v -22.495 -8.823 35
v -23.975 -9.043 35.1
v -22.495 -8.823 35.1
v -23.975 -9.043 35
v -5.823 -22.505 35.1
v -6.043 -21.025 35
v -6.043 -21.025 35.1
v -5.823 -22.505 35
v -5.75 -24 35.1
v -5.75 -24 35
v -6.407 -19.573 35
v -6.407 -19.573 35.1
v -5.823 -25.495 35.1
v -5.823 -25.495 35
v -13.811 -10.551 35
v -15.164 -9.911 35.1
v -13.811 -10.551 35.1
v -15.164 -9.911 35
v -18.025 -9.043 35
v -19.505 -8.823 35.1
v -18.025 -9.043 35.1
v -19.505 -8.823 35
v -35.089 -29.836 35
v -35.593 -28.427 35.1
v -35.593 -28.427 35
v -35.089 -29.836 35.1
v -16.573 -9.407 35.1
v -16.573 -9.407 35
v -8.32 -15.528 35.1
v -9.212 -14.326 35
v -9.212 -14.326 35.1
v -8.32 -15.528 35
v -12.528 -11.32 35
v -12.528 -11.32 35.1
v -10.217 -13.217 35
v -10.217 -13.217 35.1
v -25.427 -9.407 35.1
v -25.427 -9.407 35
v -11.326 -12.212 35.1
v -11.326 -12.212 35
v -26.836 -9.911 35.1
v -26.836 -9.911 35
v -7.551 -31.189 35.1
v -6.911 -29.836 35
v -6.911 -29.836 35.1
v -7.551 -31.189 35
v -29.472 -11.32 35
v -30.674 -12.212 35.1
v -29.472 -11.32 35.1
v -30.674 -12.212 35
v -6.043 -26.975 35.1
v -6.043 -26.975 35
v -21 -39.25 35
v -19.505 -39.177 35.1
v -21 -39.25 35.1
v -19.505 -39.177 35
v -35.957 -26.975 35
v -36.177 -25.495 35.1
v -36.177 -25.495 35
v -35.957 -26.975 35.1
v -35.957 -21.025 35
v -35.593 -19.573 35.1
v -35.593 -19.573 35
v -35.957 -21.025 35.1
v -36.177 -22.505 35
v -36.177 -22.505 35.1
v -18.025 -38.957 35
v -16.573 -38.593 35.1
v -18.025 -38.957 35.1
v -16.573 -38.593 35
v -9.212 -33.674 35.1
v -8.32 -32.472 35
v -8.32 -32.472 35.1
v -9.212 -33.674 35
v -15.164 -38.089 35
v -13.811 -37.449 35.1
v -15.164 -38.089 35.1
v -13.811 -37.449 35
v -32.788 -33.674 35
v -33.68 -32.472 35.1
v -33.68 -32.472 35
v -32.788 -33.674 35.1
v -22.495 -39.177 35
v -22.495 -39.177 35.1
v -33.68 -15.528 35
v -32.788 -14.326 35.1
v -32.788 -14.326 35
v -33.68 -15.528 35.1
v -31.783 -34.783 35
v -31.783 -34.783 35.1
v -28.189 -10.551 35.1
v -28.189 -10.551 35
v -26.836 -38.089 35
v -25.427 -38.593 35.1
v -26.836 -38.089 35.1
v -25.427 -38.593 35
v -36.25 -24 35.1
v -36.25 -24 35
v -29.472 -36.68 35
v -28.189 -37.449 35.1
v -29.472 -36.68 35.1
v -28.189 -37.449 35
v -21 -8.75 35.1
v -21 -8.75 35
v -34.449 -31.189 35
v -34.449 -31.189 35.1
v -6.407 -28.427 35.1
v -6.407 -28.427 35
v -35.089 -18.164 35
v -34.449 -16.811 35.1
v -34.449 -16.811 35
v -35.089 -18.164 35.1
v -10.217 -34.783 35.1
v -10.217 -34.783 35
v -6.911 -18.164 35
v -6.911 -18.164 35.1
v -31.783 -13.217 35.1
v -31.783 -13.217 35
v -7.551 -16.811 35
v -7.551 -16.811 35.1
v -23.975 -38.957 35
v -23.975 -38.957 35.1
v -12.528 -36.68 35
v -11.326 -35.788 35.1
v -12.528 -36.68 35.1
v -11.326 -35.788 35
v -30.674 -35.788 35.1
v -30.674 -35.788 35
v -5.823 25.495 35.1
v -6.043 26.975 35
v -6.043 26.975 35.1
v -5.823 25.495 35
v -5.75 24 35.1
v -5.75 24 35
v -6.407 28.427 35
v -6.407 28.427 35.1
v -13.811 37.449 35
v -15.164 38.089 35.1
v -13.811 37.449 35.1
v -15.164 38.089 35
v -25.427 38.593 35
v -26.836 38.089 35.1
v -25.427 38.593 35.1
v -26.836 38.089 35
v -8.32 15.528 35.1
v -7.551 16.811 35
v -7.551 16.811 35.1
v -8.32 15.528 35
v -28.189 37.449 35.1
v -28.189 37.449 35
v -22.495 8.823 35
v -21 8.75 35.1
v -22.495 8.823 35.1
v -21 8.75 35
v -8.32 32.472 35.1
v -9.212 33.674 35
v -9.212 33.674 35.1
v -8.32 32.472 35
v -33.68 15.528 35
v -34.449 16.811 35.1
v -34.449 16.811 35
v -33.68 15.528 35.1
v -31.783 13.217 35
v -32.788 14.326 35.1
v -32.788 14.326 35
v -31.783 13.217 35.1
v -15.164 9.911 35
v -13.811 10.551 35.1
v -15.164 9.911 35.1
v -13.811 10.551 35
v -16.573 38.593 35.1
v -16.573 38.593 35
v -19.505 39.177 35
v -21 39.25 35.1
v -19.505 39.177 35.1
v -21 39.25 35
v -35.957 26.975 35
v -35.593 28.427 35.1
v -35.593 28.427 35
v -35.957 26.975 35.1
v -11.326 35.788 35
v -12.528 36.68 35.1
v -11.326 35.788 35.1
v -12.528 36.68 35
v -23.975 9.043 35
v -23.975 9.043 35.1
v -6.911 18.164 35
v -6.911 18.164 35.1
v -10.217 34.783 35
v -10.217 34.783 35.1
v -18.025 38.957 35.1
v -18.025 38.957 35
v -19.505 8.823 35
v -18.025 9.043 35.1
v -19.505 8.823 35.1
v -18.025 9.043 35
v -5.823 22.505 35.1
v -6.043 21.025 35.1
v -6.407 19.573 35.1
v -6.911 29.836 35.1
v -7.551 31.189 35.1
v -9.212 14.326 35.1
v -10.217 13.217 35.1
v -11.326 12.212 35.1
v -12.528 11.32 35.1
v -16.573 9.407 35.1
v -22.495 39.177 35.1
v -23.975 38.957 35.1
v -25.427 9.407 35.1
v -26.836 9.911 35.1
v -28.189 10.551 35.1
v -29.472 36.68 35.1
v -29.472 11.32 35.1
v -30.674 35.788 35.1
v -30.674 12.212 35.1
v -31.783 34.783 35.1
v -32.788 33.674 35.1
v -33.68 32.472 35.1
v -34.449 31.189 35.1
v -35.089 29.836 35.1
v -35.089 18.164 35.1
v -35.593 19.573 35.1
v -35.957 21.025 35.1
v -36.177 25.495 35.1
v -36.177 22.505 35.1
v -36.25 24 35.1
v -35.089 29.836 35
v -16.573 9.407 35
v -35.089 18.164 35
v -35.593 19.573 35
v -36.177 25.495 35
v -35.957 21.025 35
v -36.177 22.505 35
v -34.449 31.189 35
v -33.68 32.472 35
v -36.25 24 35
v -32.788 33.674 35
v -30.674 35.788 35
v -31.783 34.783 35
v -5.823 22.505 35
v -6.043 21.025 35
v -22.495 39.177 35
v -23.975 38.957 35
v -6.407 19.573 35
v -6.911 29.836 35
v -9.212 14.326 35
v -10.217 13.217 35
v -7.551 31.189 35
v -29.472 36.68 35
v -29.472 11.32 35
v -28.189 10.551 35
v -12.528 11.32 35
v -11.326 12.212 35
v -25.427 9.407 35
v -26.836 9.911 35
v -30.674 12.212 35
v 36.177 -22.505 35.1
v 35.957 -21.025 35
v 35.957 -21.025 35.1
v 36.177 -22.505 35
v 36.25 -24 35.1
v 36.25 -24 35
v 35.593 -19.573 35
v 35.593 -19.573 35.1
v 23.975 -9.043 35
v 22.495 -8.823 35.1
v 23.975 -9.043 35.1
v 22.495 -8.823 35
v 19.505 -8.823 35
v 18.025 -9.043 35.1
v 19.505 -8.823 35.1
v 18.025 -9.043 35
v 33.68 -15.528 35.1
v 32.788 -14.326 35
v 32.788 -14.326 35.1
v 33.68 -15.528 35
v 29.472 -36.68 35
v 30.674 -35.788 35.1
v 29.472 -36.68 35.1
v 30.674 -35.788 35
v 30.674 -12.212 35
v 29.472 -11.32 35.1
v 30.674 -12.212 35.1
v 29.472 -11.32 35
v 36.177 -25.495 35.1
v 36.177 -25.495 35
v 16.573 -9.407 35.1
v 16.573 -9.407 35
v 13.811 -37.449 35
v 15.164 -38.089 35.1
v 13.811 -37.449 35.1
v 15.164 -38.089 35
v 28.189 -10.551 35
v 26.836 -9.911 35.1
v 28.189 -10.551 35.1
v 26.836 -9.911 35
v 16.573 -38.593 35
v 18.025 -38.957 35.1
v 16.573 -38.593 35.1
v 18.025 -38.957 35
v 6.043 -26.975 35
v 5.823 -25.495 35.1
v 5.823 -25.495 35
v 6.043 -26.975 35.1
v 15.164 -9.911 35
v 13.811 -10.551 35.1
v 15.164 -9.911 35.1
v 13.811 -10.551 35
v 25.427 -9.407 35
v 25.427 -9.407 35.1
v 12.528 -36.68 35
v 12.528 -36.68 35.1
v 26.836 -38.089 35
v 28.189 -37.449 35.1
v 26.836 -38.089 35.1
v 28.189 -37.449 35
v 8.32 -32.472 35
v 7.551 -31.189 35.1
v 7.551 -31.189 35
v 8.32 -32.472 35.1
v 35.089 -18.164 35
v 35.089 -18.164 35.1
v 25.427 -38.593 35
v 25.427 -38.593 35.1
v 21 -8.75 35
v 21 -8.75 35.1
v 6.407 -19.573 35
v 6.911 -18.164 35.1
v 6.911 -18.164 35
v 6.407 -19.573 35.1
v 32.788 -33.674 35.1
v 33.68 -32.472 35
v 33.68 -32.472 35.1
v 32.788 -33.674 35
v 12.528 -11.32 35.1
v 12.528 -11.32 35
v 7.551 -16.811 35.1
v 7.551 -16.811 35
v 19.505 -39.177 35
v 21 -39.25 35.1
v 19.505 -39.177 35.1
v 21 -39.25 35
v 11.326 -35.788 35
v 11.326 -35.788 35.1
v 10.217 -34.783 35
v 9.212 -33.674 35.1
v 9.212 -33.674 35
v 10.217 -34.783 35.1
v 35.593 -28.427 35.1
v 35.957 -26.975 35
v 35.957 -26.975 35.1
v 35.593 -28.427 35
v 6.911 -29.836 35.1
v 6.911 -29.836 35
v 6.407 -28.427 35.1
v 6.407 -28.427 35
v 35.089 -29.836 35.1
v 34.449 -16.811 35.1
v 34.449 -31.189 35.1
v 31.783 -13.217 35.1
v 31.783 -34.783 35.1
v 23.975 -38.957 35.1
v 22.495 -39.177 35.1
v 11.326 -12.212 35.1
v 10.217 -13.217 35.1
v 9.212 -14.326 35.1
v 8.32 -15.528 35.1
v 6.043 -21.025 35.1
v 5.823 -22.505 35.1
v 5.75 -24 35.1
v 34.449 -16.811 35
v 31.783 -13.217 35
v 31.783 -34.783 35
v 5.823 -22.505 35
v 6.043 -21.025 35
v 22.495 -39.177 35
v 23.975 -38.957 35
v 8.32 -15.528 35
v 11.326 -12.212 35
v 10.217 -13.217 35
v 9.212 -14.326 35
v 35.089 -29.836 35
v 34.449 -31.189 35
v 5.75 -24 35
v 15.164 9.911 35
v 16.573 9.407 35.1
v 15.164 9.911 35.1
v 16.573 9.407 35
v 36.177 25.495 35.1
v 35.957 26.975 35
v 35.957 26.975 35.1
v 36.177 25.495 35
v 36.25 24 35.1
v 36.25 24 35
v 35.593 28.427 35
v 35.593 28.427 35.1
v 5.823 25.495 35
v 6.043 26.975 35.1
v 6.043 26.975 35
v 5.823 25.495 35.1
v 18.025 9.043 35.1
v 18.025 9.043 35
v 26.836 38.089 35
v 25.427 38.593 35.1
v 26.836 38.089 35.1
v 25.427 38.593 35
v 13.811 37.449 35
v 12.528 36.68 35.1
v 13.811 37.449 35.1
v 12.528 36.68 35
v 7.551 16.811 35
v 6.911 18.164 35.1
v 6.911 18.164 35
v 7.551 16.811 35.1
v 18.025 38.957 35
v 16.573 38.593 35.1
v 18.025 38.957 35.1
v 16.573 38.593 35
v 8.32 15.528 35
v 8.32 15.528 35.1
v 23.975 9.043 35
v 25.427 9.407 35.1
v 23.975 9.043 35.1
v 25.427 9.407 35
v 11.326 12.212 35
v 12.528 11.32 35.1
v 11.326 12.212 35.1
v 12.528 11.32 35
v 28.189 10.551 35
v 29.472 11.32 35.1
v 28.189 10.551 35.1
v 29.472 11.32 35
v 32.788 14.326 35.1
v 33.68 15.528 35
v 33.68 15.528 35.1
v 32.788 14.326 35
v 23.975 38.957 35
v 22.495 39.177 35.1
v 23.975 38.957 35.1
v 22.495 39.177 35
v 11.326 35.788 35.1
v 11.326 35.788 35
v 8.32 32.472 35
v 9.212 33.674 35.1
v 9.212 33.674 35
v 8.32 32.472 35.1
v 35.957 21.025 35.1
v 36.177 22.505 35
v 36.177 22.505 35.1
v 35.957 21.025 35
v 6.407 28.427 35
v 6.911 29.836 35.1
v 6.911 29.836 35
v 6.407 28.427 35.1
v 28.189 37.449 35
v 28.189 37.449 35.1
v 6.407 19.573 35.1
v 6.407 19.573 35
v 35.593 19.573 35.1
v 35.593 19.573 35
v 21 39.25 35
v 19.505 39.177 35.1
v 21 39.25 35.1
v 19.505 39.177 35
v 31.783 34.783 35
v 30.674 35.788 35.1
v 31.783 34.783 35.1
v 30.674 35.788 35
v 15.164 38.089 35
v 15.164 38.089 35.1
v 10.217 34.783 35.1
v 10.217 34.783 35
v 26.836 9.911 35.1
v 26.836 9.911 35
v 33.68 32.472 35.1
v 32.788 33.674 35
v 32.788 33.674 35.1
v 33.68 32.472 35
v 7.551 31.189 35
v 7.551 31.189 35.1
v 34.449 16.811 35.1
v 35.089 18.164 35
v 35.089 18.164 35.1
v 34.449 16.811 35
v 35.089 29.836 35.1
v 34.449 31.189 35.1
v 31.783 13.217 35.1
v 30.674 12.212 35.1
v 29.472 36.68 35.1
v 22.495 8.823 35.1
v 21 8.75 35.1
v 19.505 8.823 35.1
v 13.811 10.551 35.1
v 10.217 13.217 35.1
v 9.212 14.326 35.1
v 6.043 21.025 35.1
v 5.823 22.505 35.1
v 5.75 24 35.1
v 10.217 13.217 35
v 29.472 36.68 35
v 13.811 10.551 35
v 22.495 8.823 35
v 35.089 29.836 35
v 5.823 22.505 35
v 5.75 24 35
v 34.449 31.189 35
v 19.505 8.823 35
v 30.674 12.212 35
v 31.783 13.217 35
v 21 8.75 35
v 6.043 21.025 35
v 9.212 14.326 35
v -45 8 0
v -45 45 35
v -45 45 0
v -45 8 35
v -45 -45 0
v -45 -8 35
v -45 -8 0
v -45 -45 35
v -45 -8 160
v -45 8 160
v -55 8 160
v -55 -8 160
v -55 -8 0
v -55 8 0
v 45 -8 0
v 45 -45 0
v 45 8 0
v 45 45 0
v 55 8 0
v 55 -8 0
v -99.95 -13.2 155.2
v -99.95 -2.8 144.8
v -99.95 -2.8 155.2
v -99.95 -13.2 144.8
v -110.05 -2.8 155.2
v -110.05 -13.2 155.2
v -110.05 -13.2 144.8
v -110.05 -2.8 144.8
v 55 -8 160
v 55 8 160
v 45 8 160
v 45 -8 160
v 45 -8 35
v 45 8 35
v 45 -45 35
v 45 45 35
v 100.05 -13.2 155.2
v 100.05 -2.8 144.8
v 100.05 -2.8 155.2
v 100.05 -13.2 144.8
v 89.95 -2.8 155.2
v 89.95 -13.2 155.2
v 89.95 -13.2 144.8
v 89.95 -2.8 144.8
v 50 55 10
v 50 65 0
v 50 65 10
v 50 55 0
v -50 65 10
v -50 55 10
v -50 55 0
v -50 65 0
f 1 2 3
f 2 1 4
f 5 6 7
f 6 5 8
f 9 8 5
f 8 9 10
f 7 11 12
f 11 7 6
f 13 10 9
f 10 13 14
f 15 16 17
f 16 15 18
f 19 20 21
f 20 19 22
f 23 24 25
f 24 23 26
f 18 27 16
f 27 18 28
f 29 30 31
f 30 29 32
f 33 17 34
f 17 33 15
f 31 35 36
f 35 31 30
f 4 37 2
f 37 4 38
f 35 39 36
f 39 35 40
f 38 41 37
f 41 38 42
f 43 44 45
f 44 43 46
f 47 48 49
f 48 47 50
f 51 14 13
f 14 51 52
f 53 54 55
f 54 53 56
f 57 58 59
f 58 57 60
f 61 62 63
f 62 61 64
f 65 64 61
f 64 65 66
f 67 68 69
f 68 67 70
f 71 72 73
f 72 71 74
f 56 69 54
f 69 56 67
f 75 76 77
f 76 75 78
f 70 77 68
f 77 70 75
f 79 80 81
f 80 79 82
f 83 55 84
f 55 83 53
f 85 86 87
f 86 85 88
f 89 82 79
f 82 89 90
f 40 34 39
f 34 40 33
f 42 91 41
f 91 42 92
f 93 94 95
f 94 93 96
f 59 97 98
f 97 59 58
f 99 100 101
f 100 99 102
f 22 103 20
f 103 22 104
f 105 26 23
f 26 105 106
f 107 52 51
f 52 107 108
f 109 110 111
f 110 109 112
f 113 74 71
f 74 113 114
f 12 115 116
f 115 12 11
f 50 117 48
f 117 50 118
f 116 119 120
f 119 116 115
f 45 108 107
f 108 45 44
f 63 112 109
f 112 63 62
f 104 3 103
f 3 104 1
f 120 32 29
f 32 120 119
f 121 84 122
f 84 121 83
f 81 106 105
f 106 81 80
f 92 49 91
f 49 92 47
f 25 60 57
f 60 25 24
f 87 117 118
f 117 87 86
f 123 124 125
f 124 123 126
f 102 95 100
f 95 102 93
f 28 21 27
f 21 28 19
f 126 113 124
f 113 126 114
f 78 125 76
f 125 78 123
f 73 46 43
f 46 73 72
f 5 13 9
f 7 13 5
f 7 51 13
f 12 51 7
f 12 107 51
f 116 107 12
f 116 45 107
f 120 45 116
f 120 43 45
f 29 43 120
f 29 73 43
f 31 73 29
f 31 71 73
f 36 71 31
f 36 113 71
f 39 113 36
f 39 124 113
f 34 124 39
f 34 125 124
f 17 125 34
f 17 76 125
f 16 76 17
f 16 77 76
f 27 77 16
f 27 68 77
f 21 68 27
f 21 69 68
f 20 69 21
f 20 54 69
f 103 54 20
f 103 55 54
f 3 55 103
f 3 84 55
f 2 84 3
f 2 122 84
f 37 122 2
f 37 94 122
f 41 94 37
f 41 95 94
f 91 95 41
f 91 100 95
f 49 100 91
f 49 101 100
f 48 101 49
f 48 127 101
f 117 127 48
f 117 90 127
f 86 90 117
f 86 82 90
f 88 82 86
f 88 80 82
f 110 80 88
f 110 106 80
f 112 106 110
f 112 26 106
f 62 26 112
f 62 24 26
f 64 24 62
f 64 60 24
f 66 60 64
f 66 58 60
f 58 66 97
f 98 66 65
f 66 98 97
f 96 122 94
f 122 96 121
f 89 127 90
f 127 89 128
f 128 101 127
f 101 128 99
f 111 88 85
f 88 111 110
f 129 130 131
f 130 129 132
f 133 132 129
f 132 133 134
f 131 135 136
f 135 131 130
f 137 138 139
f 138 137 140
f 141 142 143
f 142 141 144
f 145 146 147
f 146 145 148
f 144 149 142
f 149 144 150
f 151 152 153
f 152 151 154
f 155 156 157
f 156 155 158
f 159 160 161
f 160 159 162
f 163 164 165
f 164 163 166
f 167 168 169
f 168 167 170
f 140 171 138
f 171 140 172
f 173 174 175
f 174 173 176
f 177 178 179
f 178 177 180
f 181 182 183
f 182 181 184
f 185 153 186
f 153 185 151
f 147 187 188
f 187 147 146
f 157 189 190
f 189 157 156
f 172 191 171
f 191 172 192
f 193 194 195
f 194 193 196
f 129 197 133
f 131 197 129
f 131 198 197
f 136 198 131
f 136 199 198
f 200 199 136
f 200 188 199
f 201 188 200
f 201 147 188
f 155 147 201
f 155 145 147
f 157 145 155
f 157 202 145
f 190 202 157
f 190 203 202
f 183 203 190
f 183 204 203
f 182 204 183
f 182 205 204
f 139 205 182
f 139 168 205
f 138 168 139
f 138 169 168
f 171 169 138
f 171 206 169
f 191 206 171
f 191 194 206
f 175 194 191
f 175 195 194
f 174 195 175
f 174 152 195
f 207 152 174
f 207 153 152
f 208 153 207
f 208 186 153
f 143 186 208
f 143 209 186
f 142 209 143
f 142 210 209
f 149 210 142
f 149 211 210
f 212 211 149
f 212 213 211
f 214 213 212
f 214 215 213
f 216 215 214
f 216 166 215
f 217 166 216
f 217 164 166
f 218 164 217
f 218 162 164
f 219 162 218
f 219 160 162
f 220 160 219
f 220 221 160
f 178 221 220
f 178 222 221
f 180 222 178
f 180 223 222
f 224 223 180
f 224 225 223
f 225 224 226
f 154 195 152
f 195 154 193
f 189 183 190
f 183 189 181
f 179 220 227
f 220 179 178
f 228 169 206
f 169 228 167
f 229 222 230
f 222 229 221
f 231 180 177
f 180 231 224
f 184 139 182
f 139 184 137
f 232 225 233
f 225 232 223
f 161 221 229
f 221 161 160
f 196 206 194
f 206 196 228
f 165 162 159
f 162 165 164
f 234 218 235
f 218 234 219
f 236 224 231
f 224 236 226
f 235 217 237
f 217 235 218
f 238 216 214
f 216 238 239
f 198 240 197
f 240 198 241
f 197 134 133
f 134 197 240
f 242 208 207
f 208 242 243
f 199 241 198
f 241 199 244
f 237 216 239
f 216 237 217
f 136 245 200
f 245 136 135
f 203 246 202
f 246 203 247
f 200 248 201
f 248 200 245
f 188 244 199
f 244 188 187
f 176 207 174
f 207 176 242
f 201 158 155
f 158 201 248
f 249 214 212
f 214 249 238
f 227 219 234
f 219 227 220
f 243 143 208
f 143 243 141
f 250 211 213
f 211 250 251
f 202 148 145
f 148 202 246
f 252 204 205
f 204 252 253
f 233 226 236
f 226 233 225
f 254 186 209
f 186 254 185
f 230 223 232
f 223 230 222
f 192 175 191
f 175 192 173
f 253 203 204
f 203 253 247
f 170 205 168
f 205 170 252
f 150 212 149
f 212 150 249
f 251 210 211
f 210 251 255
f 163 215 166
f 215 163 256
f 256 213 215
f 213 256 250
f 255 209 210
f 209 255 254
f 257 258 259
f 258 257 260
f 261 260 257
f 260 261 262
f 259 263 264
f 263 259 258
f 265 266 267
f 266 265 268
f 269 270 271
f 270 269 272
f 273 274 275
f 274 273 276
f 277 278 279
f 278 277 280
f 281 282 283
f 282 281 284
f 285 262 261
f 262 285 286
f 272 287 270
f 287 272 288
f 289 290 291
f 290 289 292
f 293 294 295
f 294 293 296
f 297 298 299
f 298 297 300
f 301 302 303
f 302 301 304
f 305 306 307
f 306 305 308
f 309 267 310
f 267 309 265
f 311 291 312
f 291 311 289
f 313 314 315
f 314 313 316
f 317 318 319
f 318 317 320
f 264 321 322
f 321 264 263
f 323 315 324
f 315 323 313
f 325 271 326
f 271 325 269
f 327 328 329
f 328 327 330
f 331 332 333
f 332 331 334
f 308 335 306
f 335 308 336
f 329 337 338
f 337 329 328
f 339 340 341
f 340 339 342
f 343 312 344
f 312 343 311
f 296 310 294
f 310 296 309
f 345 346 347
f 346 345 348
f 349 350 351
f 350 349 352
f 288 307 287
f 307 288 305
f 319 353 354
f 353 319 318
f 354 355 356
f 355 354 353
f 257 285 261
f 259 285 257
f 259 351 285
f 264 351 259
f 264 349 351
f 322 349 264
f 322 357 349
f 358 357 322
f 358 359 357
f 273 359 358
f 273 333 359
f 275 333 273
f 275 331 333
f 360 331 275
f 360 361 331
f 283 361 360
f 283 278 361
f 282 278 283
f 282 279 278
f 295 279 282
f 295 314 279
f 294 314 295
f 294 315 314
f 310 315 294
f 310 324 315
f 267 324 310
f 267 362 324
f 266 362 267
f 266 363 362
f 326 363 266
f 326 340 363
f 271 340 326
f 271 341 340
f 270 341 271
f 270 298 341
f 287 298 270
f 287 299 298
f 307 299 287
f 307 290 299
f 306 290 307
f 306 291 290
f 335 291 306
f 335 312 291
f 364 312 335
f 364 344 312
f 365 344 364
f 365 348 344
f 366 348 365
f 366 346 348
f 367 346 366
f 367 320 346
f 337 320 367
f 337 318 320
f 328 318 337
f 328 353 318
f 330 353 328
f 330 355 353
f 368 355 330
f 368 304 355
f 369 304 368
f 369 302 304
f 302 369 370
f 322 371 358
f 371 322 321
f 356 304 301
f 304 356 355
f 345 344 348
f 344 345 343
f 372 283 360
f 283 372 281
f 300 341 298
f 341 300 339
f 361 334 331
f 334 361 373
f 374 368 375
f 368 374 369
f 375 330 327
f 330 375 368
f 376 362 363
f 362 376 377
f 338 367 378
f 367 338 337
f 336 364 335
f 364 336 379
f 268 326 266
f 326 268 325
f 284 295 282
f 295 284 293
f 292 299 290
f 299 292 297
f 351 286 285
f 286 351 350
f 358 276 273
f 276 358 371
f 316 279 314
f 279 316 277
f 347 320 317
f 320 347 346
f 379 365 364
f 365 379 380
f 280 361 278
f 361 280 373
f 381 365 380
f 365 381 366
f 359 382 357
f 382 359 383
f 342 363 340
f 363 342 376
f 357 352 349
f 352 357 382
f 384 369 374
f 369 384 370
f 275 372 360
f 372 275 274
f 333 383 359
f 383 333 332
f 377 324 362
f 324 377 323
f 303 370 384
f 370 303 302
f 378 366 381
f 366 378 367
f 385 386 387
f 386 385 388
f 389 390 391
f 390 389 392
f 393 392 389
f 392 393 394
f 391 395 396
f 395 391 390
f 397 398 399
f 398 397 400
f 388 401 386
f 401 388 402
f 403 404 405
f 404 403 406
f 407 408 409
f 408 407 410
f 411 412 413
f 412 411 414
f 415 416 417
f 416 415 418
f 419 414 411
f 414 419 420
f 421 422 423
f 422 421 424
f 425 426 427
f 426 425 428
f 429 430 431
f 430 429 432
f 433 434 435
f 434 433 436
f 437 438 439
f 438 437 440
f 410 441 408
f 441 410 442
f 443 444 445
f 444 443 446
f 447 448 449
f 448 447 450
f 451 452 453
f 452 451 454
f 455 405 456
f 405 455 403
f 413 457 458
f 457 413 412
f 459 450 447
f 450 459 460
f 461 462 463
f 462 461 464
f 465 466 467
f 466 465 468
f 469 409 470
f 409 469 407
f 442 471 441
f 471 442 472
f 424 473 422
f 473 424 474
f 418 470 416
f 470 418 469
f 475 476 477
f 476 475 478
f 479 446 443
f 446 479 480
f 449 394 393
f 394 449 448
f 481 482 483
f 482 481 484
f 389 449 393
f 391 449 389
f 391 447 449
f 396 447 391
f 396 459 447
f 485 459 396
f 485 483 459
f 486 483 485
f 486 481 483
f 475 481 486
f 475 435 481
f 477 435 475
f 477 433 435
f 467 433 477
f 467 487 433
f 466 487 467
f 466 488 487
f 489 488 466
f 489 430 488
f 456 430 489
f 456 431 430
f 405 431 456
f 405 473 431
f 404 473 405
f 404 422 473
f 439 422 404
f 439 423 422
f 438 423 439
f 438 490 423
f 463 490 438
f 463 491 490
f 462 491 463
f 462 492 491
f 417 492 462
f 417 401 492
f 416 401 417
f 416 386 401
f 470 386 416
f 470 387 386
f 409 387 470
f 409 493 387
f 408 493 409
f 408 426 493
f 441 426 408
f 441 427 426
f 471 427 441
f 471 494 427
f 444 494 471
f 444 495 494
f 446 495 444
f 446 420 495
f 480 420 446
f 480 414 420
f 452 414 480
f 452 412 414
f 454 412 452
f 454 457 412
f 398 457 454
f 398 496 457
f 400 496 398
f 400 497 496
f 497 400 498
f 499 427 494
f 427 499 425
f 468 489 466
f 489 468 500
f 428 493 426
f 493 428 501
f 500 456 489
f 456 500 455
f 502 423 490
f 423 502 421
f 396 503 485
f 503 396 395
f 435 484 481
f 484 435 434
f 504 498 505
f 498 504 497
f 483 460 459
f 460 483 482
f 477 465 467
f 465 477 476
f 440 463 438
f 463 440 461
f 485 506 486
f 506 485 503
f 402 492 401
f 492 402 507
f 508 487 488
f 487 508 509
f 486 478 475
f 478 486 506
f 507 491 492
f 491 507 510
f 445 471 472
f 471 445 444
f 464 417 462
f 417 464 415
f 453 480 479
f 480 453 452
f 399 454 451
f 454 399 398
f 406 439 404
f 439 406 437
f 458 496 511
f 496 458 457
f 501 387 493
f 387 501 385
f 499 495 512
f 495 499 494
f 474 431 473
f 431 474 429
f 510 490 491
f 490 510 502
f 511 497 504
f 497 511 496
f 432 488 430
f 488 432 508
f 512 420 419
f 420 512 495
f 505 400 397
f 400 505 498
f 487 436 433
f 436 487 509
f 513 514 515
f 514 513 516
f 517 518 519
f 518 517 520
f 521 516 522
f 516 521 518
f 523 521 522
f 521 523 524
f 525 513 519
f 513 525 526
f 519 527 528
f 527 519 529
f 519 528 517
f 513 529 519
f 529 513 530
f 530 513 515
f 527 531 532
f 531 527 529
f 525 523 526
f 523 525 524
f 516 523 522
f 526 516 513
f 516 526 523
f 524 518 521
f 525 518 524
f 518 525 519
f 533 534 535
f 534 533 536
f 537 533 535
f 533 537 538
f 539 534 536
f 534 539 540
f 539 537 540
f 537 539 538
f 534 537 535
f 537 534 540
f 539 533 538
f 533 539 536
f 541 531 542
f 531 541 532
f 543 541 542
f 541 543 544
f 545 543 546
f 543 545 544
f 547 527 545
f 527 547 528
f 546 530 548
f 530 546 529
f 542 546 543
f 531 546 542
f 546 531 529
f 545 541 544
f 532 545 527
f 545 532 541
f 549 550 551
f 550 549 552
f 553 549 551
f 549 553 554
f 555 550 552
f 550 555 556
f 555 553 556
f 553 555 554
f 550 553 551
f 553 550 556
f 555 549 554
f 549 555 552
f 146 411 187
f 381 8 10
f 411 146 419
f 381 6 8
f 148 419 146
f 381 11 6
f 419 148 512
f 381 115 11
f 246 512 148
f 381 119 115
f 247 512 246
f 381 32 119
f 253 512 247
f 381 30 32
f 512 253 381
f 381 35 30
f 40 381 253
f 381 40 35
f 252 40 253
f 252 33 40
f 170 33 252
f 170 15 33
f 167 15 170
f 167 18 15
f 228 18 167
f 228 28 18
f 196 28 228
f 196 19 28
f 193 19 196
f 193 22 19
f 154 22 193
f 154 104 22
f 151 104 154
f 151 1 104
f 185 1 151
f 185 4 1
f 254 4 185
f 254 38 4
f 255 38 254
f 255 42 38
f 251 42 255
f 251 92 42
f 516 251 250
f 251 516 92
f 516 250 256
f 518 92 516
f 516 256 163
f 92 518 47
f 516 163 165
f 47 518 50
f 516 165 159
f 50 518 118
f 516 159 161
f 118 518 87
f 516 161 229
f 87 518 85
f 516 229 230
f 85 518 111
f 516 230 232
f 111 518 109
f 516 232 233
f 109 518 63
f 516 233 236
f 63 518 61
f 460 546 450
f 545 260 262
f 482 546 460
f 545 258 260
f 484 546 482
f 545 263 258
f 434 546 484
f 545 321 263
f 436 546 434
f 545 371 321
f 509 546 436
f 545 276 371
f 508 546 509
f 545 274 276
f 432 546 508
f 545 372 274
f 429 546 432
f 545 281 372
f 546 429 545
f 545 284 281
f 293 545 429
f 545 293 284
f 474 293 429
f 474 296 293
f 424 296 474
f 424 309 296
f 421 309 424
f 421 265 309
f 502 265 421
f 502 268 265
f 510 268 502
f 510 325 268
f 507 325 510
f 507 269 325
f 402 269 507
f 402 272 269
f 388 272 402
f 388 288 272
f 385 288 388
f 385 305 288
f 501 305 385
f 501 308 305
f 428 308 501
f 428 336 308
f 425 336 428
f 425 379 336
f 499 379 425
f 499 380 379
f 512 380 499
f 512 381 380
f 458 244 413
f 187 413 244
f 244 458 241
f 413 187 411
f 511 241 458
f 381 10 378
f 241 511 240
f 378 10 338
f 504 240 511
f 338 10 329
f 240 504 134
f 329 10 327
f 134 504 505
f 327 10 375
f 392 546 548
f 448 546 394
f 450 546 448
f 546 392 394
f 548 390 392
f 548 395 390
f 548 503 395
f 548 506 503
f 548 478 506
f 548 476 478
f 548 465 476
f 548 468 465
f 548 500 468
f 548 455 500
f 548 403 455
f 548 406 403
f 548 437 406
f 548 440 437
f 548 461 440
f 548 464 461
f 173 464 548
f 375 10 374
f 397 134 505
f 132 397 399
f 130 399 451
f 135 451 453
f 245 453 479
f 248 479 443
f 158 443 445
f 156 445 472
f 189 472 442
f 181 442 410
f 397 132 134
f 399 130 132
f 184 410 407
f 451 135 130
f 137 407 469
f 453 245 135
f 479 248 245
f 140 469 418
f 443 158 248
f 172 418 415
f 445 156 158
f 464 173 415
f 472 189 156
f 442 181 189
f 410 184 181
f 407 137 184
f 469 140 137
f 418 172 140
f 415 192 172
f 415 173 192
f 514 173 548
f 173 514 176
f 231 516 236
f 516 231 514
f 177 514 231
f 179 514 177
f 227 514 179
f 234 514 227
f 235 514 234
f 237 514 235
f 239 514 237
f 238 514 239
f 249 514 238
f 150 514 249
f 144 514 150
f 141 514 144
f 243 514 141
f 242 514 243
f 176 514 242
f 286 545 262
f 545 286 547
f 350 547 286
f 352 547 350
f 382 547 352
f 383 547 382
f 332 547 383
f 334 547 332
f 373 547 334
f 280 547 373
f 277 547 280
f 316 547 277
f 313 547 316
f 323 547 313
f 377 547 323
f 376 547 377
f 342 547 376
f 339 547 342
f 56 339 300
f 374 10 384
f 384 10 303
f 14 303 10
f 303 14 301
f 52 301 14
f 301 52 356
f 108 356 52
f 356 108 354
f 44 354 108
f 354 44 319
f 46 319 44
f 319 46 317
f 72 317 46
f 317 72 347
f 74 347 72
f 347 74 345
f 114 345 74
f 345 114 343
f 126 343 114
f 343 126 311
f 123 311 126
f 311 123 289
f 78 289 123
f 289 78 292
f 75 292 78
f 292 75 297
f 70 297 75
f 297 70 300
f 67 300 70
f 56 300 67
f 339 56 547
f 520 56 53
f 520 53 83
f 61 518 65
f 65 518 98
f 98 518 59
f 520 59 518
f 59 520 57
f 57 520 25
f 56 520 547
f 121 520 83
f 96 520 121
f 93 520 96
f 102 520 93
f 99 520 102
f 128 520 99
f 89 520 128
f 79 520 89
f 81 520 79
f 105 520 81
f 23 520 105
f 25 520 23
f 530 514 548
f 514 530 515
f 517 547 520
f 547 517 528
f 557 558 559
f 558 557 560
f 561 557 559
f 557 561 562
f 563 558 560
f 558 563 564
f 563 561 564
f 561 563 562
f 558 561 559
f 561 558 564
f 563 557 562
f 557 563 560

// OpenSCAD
// Dimensions for Part 1: Base Block
base_x = 90;
base_y = 90;
base_z = 35;

// Dimensions for Part 1: Tube Seats
seat_diameter = 30.5;
seat_depth = 30;
seat_floor = 5; // base_z - seat_depth
seat_x_pos = 21;
seat_y_pos = 24;

// Dimensions for Part 1: Posts
post_x = 10;
post_y = 16;
post_z = 160;
post_hole_size = 10.4;
post_hole_z = 150;

// Dimensions for Part 2: Handle
handle_x = 100;
handle_y = 10;
handle_z = 10;
handle_y_start = 55;
handle_y_end = 65;

// Global settings
$fn = 64;

// Part 1: Base Block with Seats and Posts
// Centered on origin as requested.
translate([0, 0, 0]) {
    // Base Block
    translate([-base_x/2, -base_y/2, 0]) {
        cube([base_x, base_y, base_z], center = false);
    }
    
    // Tube Seats (Blind Holes)
    for (sx = [-seat_x_pos, seat_x_pos]) {
        for (sy = [-seat_y_pos, seat_y_pos]) {
            translate([sx, sy, seat_floor]) {
                cylinder(r = seat_diameter/2, h = seat_depth + 0.1, center = false); // +0.1 to ensure cut goes through
            }
        }
    }
    
    // Posts
    // Left Post: Flush with end face (-base_x/2), centred on y=0
    // The post is 10mm thick (X) and 16mm wide (Y).
    // It stands on the base at its X end.
    // "Flush with the end faces" means the outer face of the post aligns with the outer face of the base.
    // Base X range: [-45, 45]. Left end is -45.
    // Post X range: [-45 - 10, -45] = [-55, -45].
    // Post Y range: [-8, 8] (centered on y=0, width 16).
    translate([-base_x/2 - post_x, -post_y/2, 0]) {
        cube([post_x, post_y, post_z], center = false);
        // Hole in Left Post: Square 10.4x10.4 through X, centred at z=150
        // The hole goes through the X dimension.
        // Post center in X is -45 - 5 = -50.
        // Hole center in X is -50.
        translate([-base_x/2 - post_x/2, 0, post_hole_z]) {
            cube([post_x + 0.1, post_hole_size, post_hole_size], center = true); // +0.1 to ensure cut goes through
        }
    }
    
    // Right Post: Flush with end face (+base_x/2), centred on y=0
    // Base X range: [-45, 45]. Right end is 45.
    // Post X range: [45, 45 + 10] = [45, 55].
    // Post Y range: [-8, 8] (centered on y=0, width 16).
    translate([base_x/2, -post_y/2, 0]) {
        cube([post_x, post_y, post_z], center = false);
        // Hole in Right Post
        // Post center in X is 45 + 5 = 50.
        translate([base_x/2 + post_x/2, 0, post_hole_z]) {
            cube([post_x + 0.1, post_hole_size, post_hole_size], center = true); // +0.1 to ensure cut goes through
        }
    }
}

// Part 2: Handle
// Lying on the bed along X, centred on x=0.
// Spans y = 55 to 65.
// 10mm gap to base's +Y face (base is 90mm wide, so +Y face is at y=45. 55-45=10mm gap).
translate([0, (handle_y_start + handle_y_end)/2, handle_z/2]) { // Center handle in Y and Z
    translate([-handle_x/2, -handle_y/2, -handle_z/2]) {
        cube([handle_x, handle_y, handle_z], center = false);
    }
}
